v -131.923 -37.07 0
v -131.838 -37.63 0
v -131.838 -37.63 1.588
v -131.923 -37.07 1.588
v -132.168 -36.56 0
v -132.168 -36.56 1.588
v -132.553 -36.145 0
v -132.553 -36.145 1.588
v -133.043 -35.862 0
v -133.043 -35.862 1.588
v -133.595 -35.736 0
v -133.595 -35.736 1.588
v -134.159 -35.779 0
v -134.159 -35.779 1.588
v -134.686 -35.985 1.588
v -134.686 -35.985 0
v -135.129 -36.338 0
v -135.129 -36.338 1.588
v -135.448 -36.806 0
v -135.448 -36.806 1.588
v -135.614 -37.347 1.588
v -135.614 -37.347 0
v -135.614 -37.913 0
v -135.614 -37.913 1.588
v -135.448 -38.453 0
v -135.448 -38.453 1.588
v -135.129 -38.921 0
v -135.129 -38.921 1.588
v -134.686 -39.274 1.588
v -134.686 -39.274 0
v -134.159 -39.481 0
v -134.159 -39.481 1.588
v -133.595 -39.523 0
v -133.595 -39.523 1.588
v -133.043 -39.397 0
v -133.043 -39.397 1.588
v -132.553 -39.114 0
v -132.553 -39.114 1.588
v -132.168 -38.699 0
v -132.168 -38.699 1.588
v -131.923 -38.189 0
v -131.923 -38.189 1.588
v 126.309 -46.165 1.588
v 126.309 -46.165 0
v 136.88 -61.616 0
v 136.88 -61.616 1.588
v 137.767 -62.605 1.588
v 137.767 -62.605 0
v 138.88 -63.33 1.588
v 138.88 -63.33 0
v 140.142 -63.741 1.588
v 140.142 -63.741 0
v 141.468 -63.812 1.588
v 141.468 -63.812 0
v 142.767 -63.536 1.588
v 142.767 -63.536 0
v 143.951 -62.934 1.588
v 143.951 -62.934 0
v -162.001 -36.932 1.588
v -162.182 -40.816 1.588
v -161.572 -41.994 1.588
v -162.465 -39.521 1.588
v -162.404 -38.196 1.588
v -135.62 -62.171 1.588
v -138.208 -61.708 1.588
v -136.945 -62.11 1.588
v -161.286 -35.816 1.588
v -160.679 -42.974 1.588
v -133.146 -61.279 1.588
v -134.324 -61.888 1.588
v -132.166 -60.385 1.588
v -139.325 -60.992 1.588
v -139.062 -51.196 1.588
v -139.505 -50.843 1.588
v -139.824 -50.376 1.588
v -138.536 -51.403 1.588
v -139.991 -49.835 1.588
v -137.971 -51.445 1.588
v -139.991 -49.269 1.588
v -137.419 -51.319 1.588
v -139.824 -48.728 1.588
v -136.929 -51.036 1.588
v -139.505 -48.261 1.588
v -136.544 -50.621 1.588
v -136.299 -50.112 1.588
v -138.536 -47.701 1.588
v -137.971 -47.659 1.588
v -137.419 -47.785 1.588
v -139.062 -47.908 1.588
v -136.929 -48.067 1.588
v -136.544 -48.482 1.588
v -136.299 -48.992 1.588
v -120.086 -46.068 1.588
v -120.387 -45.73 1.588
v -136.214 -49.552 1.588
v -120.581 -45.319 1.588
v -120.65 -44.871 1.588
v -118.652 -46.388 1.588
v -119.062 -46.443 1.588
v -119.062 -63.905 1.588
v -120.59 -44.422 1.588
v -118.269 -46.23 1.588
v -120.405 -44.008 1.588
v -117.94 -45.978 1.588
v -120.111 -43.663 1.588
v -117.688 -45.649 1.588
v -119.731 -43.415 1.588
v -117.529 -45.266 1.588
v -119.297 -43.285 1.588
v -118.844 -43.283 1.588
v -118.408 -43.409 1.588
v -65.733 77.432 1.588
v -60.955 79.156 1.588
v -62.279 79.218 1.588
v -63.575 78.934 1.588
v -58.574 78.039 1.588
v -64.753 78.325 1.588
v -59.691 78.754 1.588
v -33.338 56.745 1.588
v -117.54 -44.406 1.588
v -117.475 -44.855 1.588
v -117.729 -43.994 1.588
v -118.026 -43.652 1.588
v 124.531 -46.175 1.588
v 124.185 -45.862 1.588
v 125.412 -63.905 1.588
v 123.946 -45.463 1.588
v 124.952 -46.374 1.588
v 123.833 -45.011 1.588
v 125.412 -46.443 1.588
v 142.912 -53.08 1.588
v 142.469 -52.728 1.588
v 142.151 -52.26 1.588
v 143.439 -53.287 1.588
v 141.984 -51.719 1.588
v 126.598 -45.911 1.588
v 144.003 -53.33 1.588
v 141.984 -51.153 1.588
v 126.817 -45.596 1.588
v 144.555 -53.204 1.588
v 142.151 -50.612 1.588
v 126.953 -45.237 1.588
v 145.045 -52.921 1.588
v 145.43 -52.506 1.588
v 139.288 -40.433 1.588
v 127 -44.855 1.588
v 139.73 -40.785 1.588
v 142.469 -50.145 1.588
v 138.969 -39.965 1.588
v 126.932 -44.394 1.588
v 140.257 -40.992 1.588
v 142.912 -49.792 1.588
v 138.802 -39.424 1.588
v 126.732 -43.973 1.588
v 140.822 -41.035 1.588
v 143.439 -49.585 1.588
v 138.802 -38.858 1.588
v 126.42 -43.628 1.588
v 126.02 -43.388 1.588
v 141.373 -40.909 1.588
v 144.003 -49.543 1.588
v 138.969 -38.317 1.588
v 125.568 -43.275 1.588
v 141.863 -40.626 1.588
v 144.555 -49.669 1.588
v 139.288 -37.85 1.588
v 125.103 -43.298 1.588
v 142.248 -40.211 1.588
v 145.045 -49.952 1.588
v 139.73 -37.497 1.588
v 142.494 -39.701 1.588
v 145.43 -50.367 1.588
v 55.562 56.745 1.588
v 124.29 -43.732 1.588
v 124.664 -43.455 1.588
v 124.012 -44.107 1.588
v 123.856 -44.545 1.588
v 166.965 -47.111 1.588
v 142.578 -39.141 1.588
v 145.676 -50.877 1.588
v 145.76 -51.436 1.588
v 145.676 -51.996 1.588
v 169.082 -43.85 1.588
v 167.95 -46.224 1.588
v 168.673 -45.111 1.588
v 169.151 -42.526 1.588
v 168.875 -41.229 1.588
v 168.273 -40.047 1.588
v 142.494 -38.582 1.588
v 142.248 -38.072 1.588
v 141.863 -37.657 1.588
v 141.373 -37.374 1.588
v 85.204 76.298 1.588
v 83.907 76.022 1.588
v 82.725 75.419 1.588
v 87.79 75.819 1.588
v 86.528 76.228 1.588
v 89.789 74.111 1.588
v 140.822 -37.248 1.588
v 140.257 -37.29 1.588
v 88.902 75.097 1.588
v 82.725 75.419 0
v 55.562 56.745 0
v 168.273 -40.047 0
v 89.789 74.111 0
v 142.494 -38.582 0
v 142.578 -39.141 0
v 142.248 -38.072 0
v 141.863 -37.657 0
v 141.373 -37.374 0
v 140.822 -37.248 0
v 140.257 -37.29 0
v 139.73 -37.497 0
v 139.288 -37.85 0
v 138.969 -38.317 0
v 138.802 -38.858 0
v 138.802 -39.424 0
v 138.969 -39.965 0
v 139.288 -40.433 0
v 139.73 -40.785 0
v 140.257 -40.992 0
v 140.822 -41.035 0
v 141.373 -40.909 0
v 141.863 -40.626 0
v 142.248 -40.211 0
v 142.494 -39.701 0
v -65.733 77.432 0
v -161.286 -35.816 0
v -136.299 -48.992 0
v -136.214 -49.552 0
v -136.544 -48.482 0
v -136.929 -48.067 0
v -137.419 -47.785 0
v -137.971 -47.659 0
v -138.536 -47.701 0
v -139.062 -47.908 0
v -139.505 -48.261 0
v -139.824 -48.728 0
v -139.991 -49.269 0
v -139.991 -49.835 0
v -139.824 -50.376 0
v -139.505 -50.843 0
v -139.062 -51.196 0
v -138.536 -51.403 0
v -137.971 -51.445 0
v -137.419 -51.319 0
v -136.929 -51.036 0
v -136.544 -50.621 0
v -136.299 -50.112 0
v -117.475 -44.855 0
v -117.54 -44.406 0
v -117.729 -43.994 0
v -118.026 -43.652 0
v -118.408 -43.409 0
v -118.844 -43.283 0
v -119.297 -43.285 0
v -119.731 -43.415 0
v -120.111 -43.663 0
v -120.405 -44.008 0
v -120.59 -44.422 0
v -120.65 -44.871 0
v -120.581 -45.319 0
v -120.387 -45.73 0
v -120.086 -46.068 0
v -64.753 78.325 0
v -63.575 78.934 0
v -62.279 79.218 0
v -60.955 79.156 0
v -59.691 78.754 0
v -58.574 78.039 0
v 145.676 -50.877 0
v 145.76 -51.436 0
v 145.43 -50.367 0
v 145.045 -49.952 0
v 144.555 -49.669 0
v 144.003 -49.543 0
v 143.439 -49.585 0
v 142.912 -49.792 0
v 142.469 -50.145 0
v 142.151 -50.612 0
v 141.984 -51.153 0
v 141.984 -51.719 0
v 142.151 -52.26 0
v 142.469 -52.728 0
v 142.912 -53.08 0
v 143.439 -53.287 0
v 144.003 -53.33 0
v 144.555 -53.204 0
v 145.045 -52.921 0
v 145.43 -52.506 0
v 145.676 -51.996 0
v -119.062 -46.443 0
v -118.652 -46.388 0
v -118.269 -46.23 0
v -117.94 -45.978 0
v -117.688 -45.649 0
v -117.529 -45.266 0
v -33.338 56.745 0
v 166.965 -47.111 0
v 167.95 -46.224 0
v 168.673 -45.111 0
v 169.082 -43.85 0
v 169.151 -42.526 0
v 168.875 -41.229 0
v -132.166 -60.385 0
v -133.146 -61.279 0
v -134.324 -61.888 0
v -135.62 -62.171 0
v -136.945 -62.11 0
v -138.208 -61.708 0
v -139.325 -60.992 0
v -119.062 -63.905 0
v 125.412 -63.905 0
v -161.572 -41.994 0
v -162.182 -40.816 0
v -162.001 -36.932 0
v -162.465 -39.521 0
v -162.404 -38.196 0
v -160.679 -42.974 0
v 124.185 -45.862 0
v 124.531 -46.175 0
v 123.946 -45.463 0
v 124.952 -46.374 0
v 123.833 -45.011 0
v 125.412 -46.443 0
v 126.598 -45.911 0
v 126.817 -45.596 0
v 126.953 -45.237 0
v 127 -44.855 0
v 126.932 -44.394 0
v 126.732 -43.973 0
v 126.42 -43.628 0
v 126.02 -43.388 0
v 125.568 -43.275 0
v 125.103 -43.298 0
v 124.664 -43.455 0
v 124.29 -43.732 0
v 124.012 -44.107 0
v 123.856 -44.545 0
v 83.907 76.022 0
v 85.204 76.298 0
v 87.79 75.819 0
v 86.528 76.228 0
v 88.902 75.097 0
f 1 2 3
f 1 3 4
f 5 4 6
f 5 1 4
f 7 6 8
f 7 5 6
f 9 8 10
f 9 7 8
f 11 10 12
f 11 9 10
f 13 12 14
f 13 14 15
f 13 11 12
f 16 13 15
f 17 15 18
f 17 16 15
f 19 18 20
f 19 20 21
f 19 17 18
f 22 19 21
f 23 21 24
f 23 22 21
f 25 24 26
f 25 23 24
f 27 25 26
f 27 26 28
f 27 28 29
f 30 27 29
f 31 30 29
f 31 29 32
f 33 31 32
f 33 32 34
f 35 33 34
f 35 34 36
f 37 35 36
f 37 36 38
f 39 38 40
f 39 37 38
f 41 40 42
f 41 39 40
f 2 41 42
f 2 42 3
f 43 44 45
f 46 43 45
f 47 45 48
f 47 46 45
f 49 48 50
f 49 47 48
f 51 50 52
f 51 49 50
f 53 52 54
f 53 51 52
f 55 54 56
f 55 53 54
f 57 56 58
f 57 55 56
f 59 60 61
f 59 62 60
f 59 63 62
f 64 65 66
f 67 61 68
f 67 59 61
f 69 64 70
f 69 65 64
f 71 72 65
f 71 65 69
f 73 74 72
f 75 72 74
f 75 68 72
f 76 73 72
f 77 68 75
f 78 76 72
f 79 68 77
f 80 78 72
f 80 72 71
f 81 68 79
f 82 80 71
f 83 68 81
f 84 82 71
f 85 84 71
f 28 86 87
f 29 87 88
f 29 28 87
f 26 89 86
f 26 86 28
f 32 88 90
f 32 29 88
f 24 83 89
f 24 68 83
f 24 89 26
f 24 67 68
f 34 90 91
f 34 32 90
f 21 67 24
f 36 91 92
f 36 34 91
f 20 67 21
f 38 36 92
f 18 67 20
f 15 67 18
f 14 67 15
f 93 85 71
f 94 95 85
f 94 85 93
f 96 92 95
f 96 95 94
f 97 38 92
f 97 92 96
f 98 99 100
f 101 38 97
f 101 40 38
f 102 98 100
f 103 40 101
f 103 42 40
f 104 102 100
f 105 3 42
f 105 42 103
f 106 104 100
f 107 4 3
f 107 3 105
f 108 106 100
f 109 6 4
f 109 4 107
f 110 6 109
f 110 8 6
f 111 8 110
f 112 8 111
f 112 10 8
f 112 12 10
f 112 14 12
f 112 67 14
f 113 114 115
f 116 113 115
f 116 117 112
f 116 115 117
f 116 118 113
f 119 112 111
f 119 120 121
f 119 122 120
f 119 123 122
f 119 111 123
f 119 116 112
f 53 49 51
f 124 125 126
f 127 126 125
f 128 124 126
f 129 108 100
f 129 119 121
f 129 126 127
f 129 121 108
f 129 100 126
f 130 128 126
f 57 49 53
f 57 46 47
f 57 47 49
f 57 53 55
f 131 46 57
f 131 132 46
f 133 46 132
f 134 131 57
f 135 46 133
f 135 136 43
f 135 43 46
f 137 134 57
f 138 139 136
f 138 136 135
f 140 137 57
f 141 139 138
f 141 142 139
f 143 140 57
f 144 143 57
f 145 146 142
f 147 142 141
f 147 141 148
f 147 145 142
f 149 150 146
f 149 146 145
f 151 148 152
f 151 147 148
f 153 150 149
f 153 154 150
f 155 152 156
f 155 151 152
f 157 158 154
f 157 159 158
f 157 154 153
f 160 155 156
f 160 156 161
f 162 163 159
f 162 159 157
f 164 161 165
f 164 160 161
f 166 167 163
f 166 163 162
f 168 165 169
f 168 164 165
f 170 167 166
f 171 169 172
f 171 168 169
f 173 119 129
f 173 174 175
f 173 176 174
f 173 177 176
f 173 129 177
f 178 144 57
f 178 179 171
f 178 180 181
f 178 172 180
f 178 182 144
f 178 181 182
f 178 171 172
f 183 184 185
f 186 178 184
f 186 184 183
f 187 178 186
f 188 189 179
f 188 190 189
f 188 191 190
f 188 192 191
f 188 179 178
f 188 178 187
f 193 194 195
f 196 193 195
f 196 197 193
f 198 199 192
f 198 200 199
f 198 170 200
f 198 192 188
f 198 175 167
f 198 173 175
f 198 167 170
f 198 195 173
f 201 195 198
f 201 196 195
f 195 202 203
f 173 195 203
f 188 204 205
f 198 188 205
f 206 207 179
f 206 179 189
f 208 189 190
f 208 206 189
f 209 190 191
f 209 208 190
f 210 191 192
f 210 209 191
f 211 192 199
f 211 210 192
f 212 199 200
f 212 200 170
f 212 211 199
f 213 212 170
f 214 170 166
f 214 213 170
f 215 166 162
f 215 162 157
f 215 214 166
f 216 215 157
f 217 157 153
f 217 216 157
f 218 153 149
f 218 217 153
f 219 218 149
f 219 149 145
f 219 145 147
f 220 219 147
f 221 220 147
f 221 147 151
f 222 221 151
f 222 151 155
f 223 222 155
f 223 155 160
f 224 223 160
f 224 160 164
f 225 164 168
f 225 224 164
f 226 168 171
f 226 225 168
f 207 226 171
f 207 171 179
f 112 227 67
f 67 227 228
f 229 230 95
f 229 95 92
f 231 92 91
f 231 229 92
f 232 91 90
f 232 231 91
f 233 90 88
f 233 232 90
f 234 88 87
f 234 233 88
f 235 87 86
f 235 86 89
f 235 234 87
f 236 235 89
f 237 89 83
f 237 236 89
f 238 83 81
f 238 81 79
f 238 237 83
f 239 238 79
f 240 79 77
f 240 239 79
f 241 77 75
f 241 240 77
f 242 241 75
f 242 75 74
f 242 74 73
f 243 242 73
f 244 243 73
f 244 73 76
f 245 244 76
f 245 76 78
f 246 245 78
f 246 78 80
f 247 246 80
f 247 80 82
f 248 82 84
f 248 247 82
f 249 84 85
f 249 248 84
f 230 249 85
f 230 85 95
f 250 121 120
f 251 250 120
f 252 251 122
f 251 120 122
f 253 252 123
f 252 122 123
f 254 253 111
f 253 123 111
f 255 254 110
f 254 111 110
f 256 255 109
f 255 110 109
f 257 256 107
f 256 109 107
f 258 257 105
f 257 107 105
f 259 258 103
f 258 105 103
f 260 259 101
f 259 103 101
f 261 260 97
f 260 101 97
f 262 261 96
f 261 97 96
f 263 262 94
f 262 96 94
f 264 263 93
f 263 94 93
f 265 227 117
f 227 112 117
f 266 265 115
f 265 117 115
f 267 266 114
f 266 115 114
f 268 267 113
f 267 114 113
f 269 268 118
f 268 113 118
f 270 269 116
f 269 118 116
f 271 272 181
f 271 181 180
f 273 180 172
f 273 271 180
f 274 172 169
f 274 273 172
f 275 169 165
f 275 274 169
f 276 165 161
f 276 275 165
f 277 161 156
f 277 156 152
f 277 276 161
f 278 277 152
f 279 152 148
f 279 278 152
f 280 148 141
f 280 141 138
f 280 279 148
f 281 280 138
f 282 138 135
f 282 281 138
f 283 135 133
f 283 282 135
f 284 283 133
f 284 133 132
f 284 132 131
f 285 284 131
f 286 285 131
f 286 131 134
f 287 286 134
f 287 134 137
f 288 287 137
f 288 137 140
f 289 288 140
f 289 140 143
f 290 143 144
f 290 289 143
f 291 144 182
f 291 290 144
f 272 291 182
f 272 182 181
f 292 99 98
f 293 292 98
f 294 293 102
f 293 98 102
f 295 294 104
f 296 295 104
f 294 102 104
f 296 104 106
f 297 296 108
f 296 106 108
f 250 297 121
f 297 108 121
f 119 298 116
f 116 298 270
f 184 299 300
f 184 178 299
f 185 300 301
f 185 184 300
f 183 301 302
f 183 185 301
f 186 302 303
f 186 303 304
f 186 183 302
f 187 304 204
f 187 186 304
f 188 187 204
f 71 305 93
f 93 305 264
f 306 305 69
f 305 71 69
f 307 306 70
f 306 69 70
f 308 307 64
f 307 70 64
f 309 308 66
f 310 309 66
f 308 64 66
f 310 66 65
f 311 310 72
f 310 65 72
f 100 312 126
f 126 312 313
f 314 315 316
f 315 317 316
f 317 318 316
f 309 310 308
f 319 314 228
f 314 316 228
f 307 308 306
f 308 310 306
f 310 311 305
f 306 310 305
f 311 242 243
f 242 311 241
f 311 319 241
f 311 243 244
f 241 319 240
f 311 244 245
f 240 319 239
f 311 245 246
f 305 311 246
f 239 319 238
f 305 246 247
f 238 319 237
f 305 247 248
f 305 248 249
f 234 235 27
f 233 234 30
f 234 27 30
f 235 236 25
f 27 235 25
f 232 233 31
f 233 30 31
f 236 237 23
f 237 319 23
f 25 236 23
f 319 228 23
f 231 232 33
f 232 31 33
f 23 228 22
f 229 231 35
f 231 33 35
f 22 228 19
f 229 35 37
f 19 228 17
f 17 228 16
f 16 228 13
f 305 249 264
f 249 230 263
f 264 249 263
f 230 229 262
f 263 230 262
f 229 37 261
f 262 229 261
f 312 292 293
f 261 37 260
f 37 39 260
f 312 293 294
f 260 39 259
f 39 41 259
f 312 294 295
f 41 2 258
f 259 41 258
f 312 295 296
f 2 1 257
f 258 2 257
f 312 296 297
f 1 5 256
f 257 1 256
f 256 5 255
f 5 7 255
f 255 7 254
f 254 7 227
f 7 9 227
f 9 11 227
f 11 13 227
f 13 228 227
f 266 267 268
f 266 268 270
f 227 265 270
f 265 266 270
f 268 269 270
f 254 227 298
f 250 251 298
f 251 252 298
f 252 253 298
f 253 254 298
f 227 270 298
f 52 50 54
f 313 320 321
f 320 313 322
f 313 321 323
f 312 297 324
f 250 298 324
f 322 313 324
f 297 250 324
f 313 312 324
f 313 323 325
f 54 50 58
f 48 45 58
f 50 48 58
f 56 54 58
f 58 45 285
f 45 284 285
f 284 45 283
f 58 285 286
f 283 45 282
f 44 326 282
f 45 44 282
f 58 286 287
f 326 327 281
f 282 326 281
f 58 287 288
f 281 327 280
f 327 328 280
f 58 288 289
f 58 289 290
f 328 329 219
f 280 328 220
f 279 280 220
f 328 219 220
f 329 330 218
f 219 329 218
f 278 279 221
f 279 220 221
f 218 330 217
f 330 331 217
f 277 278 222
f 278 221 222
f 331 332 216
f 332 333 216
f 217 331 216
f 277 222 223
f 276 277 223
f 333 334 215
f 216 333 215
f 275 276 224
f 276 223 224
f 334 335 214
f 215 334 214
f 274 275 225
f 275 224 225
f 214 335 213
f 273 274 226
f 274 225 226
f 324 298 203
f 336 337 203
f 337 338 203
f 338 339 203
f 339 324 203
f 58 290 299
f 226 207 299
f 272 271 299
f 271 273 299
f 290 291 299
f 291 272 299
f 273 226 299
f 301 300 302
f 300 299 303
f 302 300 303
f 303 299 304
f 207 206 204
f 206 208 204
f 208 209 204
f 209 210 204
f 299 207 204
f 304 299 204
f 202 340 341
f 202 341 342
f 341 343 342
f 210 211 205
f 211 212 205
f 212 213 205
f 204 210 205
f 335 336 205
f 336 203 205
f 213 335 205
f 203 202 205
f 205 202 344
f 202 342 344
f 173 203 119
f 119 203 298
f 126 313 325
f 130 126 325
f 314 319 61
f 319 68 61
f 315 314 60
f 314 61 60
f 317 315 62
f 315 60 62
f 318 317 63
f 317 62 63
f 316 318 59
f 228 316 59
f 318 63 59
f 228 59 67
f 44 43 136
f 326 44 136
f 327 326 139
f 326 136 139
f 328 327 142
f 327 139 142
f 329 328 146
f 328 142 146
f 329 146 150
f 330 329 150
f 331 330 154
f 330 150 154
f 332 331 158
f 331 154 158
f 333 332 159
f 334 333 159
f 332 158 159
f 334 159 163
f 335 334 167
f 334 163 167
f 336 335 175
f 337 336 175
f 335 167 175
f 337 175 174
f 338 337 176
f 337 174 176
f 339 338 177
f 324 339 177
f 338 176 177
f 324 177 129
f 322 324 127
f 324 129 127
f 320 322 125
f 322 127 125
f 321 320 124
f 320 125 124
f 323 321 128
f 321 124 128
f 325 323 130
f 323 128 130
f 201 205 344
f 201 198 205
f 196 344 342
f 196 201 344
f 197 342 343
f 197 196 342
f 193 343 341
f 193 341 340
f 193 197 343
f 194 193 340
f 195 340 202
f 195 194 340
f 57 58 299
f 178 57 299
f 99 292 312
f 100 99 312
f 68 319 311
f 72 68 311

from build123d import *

# Parameters (mm, degrees)
F0_R     = 1.89865
F1_DEPTH = 1.5875
F2_R     = 5.08
F4_DEPTH = 1.5875


with BuildPart() as f1:
    # F0 (on Top) → F1 (new body)
    with BuildSketch(Plane.XY):
        Polygon((-33.3375, 56.7449798869), (-119.0625, -44.8550201131), (-119.0625, -63.9050201131), (125.4125, -63.9050201131), (125.4125, -44.8550201131), (55.5625, 56.7449798869), (46.0375, 56.7449798869), (17.4625, 56.7449798869), (0, 56.7449798869), align=None)
        Polygon((-135.4422218559, -64.2680237942), (-119.0625, -44.8550201131), (-33.3375, 56.7449798869), (-62.4570055217, 81.3145626708), (-164.5617273776, -39.6984410103), align=None)
        with Locations((-138.1131343099, -49.5519186622)):
            Circle(F0_R, mode=Mode.SUBTRACT)
        with Locations((-133.7370015814, -37.6296931006)):
            Circle(F0_R, mode=Mode.SUBTRACT)
        Polygon((55.5625, 56.7449798869), (125.4125, -44.8550201131), (139.7551548144, -65.8180411948), (171.1511521264, -44.2332930428), (86.9113565218, 78.2973187457), align=None)
        with Locations((143.8612788229, -51.4362030224)):
            Circle(F0_R, mode=Mode.SUBTRACT)
        with Locations((140.6796238031, -39.1412011381)):
            Circle(F0_R, mode=Mode.SUBTRACT)
    extrude(amount=F1_DEPTH)

    # F2
    f2_edges = [f1.edges().sort_by_distance(p)[0] for p in [
        (-164.561727, -39.698441, 0.79375),
        (-135.442222, -64.268024, 0.79375),
        (139.755155, -65.818041, 0.79375),
        (171.151152, -44.233293, 0.79375),
        (86.911357, 78.297319, 0.79375),
        (-62.457006, 81.314563, 0.79375),
    ]]
    fillet(f2_edges, radius=F2_R)

    # F3 (on face) → F4 (cut, through all)
    with BuildSketch(Plane.XY.offset(1.5875)):
        with BuildLine():
            ThreePointArc((127, -44.8550201131), (124.2899679849, -43.7324880979), (125.4125, -46.4425201131))
            Line((125.4125, -46.4425201131), (125.4125, -44.8550201131))
            Line((125.4125, -44.8550201131), (126.3089159259, -46.1652089307))
            ThreePointArc((126.3089159259, -46.1652089307), (126.816639689, -45.5956603657), (127, -44.8550201131))
        make_face()
        with BuildLine():
            ThreePointArc((-119.0625, -46.4425201131), (-117.9399679849, -45.9775521282), (-117.475, -44.8550201131))
            ThreePointArc((-117.475, -44.8550201131), (-119.7314472035, -43.4153444937), (-120.086232616, -46.0683328431))
            Line((-120.086232616, -46.0683328431), (-119.0625, -44.8550201131))
            Line((-119.0625, -44.8550201131), (-119.0625, -46.4425201131))
        make_face()
    extrude(amount=-F4_DEPTH, mode=Mode.SUBTRACT)


solid = f1.part
